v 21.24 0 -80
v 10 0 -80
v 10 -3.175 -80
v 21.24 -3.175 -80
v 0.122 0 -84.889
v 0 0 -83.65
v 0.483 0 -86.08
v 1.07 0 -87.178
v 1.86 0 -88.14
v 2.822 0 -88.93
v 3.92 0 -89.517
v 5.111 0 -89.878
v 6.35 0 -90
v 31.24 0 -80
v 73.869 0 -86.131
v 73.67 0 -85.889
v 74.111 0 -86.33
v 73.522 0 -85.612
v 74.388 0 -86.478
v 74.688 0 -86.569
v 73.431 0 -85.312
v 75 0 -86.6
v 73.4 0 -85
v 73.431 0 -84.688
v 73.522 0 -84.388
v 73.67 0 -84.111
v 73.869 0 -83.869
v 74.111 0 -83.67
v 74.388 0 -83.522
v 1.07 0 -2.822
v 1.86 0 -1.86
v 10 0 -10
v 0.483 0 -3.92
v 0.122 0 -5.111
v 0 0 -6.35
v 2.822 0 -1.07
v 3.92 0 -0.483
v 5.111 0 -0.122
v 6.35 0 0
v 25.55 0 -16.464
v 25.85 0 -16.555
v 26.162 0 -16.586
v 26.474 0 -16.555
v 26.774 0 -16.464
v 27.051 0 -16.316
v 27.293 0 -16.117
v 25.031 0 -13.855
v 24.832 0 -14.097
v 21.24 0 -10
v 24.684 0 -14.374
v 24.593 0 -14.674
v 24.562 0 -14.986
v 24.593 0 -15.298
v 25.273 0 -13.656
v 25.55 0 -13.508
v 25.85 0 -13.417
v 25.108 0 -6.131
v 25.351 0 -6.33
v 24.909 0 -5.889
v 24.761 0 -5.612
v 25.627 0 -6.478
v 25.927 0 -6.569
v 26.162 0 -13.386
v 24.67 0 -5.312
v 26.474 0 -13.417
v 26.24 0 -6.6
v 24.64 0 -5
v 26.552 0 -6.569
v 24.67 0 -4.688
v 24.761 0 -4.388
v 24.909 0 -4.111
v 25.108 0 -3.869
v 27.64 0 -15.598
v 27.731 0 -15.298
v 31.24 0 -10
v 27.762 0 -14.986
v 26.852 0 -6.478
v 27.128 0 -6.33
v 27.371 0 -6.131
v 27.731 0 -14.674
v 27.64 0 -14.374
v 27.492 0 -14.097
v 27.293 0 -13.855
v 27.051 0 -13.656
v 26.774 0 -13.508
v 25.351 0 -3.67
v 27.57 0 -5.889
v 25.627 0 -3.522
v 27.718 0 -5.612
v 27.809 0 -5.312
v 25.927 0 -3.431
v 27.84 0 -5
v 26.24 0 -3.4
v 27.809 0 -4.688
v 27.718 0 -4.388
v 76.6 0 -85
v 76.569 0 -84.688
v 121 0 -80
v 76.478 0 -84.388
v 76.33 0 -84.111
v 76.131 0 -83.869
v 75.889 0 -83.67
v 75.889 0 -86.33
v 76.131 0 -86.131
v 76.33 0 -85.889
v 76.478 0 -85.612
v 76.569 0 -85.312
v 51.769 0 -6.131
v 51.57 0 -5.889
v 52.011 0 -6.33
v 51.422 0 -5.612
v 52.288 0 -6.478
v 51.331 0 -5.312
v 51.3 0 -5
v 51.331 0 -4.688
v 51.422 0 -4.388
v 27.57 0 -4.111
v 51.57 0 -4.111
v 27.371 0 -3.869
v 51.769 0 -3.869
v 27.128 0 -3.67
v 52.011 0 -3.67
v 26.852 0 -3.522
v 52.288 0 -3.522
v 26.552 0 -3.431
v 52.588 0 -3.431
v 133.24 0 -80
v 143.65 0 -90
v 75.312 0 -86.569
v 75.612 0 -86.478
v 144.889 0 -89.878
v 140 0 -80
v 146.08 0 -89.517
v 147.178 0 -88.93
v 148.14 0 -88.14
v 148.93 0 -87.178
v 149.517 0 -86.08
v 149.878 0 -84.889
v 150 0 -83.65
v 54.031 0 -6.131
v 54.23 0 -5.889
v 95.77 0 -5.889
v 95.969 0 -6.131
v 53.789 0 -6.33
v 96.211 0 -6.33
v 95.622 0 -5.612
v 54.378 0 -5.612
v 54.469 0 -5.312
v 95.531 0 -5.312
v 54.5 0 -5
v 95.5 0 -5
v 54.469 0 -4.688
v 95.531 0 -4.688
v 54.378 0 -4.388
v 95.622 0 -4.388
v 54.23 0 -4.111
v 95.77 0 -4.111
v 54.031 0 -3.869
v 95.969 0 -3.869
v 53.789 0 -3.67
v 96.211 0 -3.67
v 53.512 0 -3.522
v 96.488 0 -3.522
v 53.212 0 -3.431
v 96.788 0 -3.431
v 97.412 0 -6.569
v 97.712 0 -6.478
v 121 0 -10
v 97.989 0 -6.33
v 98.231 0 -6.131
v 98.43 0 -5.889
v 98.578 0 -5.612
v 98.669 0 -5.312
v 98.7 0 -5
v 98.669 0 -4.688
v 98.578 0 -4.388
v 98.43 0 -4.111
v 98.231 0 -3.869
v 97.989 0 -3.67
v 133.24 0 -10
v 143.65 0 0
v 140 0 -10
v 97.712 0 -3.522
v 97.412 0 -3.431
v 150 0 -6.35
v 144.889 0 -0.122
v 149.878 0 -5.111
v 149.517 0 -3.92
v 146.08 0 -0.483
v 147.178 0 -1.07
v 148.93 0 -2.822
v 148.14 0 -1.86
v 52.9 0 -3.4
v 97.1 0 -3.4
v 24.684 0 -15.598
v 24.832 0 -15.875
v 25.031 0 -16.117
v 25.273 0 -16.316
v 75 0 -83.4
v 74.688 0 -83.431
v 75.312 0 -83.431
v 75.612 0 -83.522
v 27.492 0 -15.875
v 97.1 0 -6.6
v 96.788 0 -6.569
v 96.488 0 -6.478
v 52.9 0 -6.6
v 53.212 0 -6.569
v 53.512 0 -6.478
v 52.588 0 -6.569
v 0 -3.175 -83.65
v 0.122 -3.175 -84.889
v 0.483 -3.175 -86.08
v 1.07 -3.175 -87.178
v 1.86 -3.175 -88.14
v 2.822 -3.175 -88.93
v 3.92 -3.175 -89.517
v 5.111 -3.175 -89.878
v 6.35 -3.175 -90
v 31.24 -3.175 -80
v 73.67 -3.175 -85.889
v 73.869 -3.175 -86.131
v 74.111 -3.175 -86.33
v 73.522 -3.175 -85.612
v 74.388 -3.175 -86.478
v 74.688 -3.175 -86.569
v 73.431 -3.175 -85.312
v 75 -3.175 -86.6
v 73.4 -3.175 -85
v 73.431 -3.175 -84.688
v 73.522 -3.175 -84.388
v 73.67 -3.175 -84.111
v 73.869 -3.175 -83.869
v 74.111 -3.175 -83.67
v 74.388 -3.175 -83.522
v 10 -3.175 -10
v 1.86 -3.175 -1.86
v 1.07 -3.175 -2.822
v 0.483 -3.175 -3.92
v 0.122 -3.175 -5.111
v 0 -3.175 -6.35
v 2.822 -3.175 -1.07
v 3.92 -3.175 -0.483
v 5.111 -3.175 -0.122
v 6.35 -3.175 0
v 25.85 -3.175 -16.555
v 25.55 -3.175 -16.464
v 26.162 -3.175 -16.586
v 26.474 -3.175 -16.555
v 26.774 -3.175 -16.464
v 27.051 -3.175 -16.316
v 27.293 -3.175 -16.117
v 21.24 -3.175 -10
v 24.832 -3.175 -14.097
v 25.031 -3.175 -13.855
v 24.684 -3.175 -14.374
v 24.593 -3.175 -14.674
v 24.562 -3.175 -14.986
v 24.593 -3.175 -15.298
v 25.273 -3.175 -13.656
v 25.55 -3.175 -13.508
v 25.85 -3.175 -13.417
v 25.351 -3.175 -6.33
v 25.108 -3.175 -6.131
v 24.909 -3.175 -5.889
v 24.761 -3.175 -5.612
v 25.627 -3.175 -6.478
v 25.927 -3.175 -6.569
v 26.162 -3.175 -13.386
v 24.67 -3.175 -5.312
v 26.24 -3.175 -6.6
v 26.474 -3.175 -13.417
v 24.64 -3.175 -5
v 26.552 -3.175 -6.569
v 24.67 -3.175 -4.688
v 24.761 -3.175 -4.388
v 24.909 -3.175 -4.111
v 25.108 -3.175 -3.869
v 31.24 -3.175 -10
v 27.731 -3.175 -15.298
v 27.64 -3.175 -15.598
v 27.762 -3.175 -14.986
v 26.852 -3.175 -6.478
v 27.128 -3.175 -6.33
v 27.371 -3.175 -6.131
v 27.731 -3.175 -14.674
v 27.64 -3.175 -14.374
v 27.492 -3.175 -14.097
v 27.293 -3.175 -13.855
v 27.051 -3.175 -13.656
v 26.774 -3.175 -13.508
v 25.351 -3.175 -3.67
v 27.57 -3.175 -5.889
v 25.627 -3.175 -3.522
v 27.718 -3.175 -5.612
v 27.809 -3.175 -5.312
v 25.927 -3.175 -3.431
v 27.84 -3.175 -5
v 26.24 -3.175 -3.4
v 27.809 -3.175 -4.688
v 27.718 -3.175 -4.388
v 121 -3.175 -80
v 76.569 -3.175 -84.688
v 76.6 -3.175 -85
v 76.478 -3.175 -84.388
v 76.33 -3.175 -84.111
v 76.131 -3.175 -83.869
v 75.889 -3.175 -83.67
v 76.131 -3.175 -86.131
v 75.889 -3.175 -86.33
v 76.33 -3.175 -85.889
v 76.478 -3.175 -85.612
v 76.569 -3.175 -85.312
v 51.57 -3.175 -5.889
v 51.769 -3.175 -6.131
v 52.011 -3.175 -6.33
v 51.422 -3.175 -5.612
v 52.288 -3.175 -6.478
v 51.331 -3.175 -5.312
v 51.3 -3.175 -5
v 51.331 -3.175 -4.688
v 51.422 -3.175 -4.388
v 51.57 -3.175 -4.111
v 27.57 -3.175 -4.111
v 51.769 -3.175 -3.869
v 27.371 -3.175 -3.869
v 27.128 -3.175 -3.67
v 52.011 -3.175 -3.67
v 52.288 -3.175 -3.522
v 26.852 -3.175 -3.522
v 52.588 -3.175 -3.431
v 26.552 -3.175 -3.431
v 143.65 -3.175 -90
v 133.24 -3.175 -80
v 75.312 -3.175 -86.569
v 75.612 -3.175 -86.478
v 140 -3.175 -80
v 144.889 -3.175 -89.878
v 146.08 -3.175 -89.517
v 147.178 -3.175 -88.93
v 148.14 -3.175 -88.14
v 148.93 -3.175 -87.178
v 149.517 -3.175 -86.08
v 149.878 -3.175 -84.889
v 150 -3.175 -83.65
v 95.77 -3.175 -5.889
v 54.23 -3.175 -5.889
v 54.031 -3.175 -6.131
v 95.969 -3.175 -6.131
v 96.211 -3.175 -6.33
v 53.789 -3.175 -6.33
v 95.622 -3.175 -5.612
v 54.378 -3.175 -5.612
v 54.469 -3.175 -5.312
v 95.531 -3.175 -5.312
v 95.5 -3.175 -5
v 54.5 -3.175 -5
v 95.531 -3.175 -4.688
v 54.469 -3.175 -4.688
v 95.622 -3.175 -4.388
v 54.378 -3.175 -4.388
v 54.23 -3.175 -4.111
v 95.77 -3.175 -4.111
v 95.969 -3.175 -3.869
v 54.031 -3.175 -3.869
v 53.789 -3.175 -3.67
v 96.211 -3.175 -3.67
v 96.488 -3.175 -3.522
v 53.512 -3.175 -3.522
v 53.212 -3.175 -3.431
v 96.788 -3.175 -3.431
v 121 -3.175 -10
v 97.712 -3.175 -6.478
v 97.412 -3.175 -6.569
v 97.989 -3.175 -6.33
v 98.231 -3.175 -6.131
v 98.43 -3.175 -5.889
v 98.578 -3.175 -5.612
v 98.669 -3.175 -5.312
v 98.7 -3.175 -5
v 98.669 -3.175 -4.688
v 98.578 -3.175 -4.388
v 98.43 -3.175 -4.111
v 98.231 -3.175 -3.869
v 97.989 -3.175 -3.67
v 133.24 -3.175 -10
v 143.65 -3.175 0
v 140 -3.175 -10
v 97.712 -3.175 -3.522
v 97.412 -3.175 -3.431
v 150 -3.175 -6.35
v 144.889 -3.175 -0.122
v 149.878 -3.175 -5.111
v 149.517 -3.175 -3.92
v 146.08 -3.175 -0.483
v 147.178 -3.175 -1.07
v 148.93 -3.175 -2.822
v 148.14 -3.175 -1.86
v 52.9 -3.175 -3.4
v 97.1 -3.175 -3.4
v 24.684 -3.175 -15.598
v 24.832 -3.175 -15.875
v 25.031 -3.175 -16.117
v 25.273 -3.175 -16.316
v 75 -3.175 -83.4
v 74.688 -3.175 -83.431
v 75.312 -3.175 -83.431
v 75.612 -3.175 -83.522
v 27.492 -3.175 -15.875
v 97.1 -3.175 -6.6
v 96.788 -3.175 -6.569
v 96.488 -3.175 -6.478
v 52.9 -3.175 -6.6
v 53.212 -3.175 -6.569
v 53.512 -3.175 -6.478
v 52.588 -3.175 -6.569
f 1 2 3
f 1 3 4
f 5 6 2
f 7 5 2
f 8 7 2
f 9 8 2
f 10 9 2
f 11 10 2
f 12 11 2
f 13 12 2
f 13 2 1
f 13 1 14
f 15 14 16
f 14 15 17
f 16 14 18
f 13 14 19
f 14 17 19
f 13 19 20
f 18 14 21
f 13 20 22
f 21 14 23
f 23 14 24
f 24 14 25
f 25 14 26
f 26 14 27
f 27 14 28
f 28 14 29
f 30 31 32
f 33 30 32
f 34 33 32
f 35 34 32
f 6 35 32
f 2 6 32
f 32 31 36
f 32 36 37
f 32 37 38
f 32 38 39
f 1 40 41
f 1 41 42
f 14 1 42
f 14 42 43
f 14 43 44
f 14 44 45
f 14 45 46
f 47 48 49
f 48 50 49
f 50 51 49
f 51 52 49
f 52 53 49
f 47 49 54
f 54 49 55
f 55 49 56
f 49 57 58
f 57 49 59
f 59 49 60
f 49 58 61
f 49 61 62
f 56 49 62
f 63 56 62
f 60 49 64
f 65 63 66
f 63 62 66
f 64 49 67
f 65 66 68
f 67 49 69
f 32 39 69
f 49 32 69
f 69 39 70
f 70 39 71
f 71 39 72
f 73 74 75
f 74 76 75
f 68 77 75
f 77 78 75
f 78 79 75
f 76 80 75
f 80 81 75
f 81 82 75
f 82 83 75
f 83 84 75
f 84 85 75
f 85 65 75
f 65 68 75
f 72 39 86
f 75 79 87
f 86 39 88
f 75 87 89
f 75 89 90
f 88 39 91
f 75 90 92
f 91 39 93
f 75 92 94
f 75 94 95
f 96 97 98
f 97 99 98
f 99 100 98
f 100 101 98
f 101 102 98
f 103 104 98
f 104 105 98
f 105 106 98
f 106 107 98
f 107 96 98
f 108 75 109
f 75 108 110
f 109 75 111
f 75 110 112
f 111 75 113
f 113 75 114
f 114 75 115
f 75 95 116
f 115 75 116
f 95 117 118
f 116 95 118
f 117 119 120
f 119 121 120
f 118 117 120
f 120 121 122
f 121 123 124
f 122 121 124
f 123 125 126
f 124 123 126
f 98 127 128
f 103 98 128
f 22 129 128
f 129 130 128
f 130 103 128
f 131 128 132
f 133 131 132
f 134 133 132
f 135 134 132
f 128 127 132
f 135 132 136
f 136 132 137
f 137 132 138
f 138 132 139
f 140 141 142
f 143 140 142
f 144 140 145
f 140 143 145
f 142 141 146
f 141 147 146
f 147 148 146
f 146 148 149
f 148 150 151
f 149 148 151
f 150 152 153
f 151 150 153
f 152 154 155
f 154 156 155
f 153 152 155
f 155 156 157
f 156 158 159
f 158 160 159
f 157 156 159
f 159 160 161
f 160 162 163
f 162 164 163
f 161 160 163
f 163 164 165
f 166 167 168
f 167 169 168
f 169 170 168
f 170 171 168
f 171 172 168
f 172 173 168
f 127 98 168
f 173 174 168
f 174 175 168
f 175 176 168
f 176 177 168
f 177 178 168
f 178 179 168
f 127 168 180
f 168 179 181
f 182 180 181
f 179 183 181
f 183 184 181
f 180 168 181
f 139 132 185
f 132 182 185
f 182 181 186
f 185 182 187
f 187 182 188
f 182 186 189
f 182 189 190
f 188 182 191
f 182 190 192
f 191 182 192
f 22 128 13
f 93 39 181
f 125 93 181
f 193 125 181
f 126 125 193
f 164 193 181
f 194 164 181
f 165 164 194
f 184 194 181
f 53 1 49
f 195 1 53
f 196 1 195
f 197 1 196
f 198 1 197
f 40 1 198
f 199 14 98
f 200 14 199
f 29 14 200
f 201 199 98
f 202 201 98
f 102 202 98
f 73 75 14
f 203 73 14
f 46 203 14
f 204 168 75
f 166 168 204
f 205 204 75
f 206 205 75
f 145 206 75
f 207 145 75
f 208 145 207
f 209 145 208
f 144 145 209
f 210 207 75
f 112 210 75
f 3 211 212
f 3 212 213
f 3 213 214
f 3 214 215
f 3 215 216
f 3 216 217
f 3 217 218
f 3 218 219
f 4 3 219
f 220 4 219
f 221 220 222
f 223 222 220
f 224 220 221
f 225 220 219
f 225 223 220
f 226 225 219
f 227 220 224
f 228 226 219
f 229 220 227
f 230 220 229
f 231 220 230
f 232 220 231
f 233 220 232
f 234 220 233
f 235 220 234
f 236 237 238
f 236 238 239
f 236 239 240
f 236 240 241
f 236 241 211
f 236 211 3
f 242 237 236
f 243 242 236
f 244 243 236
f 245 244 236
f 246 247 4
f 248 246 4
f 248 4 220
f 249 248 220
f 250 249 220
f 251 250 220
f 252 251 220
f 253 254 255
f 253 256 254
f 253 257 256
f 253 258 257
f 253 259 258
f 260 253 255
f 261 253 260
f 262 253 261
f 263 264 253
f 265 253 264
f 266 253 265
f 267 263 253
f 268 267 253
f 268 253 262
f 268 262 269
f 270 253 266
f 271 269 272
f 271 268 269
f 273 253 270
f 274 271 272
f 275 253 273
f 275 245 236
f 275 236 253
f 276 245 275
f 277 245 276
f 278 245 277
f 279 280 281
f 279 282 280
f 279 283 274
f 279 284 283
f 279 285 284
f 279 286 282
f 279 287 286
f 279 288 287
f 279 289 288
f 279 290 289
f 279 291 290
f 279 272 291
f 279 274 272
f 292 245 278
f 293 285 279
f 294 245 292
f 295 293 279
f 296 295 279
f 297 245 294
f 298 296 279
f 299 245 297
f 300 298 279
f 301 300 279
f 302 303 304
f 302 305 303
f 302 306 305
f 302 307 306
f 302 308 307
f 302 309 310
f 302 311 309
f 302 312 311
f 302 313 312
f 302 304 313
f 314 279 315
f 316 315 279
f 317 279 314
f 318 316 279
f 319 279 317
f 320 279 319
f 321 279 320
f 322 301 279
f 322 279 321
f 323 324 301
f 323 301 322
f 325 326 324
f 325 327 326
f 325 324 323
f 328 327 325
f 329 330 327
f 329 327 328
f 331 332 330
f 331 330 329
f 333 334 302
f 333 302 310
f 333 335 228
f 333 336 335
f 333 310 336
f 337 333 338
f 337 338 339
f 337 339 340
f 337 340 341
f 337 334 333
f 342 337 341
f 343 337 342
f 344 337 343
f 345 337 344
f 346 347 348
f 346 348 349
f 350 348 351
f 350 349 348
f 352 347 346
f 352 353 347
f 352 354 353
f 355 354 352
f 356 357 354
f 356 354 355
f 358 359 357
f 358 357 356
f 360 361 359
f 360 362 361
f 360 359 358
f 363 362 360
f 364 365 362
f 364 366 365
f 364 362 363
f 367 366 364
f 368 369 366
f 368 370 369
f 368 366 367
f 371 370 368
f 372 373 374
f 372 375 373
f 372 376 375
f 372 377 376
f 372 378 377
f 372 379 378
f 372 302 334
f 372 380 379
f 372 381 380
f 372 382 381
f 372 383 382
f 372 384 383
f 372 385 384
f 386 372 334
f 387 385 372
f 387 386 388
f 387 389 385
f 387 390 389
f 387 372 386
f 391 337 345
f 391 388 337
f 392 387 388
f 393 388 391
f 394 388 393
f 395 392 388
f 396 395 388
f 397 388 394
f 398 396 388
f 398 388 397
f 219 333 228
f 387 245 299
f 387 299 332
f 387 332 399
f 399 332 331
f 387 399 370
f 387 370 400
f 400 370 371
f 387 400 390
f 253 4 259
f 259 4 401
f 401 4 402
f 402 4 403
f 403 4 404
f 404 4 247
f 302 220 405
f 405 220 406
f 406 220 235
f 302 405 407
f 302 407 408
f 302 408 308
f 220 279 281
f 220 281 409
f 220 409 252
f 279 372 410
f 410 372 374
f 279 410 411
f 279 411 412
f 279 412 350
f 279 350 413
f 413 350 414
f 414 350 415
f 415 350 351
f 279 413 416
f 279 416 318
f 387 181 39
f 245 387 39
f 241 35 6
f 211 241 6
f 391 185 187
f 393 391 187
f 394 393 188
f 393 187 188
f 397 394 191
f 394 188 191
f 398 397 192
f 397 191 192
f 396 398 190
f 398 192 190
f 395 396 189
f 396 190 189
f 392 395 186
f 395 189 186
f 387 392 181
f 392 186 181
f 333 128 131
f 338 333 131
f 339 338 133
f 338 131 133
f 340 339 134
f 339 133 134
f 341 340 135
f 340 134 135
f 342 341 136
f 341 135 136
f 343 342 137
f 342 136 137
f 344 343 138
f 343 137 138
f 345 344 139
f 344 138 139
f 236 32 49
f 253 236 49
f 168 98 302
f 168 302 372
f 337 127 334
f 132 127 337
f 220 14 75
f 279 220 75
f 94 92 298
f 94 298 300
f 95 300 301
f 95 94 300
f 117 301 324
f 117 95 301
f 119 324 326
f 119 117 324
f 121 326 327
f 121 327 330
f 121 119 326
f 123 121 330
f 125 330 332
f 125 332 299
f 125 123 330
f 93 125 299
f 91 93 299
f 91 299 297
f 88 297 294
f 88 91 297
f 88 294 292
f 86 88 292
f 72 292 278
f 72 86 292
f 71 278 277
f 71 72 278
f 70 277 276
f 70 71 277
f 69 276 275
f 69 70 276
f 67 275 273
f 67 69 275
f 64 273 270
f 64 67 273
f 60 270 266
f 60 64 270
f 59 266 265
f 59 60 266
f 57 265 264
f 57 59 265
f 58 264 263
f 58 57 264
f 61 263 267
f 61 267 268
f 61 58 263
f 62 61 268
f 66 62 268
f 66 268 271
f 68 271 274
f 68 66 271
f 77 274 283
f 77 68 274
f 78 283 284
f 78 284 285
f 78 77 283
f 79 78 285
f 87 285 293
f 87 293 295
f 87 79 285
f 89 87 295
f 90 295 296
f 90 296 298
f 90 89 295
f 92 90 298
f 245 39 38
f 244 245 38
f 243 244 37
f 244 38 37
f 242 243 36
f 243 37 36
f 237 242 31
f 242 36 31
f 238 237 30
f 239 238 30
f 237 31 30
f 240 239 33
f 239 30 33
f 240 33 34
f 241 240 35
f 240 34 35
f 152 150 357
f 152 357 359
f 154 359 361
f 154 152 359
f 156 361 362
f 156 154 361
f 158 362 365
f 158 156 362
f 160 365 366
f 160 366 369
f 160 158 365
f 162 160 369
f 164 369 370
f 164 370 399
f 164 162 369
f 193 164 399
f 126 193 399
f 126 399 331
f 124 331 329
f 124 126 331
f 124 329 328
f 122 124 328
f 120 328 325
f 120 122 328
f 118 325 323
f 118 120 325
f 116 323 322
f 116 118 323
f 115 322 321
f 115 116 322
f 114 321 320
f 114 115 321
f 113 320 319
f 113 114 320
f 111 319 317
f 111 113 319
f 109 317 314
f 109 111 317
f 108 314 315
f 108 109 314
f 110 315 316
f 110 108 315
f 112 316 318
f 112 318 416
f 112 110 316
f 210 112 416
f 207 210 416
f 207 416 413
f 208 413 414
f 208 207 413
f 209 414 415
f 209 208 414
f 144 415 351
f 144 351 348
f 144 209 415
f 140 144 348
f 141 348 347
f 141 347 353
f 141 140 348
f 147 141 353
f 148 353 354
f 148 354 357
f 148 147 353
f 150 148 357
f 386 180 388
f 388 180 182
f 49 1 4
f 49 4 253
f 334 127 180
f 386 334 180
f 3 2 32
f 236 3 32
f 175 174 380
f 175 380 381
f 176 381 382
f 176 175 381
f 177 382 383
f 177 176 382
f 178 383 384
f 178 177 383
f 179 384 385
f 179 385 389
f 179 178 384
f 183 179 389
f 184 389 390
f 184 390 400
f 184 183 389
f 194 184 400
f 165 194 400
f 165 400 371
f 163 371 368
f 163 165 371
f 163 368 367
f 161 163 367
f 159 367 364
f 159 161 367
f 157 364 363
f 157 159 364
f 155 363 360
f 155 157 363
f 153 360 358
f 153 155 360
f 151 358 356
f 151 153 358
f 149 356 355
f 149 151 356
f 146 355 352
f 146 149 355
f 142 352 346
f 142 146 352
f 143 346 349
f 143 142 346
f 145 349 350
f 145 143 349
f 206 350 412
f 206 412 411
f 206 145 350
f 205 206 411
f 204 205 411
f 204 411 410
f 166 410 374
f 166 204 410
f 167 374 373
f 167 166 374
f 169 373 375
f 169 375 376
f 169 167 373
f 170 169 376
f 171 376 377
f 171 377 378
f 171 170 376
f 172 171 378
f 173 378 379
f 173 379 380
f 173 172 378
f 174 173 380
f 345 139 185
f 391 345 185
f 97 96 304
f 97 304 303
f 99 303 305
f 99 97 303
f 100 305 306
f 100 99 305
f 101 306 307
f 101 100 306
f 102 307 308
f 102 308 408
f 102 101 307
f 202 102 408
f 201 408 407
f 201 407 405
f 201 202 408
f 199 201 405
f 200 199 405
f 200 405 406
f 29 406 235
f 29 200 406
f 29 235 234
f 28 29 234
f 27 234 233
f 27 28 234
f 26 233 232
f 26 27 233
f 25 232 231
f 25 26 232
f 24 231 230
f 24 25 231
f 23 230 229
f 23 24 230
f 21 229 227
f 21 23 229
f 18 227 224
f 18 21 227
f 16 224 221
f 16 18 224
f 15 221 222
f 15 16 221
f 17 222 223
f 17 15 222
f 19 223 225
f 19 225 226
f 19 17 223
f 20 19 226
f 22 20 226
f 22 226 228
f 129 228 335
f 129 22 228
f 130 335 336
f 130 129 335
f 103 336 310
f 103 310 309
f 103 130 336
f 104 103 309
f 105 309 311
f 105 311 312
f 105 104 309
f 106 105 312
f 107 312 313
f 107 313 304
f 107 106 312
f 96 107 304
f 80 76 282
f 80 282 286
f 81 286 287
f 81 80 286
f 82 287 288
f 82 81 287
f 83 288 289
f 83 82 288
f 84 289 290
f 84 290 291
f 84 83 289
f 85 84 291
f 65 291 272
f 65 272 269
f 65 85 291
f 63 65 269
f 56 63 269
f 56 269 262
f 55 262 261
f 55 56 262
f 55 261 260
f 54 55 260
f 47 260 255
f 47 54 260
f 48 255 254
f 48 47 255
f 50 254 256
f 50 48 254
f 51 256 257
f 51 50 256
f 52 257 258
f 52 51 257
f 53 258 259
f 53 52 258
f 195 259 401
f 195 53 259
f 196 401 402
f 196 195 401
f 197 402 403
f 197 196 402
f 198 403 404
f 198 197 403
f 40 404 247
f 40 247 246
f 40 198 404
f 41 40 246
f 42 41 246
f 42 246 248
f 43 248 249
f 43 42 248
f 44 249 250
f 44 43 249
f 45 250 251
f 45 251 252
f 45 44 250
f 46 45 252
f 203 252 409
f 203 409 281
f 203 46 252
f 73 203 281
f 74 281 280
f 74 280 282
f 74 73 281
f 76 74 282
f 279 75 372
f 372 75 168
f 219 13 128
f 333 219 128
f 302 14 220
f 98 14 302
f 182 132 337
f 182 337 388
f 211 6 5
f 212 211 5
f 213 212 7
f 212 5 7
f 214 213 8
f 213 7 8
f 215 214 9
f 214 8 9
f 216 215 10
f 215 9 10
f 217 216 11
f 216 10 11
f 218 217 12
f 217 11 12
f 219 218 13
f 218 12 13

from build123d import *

# Parameters (mm, degrees)
F0_R     = 1.6
F0_W     = 11.2395305085
F0_H     = 70
F0_W_2   = 89.7604694915
F0_W_3   = 6.7604694915
F1_DEPTH = 3.175


# Not quite as in the source:
# - a length typed as a fraction of an inch, garbled in the dataset ("3 / 203.2 mm" for 3/8 in), is restored


with BuildPart() as f1:
    # F0 (on Front) → F1 (new body)
    with BuildSketch(Plane.XZ):
        with BuildLine():
            Line((21.2395305085, 0), (6.35, 0))
            ThreePointArc((6.35, 0), (1.8598719395, -1.8598719395), (0, -6.35))
            Line((0, -6.35), (0, -83.65))
            ThreePointArc((0, -83.65), (1.8598719395, -88.1401280605), (6.35, -90))
            Line((6.35, -90), (21.2395305085, -90))
            Line((21.2395305085, -90), (31.2395305085, -90))
            Line((31.2395305085, -90), (143.65, -90))
            ThreePointArc((143.65, -90), (148.1401280605, -88.1401280605), (150, -83.65))
            Line((150, -83.65), (150, -6.35))
            ThreePointArc((150, -6.35), (148.1401280605, -1.8598719395), (143.65, 0))
            Line((143.65, 0), (31.2395305085, 0))
            Line((31.2395305085, 0), (21.2395305085, 0))
        make_face()
        with Locations((75, -85)):
            Circle(F0_R, mode=Mode.SUBTRACT)
        with Locations((15.6197652543, -45)):
            Rectangle(F0_W, F0_H, mode=Mode.SUBTRACT)
        with Locations((26.162, -14.986)):
            Circle(F0_R, mode=Mode.SUBTRACT)
        with Locations((26.2395305085, -5)):
            Circle(F0_R, mode=Mode.SUBTRACT)
        with Locations((52.9, -5)):
            Circle(F0_R, mode=Mode.SUBTRACT)
        with Locations((76.1197652543, -45)):
            Rectangle(F0_W_2, F0_H, mode=Mode.SUBTRACT)
        with Locations((136.6197652543, -45)):
            Rectangle(F0_W_3, F0_H, mode=Mode.SUBTRACT)
        with Locations((97.1, -5)):
            Circle(F0_R, mode=Mode.SUBTRACT)
    extrude(amount=F1_DEPTH)


solid = f1.part
